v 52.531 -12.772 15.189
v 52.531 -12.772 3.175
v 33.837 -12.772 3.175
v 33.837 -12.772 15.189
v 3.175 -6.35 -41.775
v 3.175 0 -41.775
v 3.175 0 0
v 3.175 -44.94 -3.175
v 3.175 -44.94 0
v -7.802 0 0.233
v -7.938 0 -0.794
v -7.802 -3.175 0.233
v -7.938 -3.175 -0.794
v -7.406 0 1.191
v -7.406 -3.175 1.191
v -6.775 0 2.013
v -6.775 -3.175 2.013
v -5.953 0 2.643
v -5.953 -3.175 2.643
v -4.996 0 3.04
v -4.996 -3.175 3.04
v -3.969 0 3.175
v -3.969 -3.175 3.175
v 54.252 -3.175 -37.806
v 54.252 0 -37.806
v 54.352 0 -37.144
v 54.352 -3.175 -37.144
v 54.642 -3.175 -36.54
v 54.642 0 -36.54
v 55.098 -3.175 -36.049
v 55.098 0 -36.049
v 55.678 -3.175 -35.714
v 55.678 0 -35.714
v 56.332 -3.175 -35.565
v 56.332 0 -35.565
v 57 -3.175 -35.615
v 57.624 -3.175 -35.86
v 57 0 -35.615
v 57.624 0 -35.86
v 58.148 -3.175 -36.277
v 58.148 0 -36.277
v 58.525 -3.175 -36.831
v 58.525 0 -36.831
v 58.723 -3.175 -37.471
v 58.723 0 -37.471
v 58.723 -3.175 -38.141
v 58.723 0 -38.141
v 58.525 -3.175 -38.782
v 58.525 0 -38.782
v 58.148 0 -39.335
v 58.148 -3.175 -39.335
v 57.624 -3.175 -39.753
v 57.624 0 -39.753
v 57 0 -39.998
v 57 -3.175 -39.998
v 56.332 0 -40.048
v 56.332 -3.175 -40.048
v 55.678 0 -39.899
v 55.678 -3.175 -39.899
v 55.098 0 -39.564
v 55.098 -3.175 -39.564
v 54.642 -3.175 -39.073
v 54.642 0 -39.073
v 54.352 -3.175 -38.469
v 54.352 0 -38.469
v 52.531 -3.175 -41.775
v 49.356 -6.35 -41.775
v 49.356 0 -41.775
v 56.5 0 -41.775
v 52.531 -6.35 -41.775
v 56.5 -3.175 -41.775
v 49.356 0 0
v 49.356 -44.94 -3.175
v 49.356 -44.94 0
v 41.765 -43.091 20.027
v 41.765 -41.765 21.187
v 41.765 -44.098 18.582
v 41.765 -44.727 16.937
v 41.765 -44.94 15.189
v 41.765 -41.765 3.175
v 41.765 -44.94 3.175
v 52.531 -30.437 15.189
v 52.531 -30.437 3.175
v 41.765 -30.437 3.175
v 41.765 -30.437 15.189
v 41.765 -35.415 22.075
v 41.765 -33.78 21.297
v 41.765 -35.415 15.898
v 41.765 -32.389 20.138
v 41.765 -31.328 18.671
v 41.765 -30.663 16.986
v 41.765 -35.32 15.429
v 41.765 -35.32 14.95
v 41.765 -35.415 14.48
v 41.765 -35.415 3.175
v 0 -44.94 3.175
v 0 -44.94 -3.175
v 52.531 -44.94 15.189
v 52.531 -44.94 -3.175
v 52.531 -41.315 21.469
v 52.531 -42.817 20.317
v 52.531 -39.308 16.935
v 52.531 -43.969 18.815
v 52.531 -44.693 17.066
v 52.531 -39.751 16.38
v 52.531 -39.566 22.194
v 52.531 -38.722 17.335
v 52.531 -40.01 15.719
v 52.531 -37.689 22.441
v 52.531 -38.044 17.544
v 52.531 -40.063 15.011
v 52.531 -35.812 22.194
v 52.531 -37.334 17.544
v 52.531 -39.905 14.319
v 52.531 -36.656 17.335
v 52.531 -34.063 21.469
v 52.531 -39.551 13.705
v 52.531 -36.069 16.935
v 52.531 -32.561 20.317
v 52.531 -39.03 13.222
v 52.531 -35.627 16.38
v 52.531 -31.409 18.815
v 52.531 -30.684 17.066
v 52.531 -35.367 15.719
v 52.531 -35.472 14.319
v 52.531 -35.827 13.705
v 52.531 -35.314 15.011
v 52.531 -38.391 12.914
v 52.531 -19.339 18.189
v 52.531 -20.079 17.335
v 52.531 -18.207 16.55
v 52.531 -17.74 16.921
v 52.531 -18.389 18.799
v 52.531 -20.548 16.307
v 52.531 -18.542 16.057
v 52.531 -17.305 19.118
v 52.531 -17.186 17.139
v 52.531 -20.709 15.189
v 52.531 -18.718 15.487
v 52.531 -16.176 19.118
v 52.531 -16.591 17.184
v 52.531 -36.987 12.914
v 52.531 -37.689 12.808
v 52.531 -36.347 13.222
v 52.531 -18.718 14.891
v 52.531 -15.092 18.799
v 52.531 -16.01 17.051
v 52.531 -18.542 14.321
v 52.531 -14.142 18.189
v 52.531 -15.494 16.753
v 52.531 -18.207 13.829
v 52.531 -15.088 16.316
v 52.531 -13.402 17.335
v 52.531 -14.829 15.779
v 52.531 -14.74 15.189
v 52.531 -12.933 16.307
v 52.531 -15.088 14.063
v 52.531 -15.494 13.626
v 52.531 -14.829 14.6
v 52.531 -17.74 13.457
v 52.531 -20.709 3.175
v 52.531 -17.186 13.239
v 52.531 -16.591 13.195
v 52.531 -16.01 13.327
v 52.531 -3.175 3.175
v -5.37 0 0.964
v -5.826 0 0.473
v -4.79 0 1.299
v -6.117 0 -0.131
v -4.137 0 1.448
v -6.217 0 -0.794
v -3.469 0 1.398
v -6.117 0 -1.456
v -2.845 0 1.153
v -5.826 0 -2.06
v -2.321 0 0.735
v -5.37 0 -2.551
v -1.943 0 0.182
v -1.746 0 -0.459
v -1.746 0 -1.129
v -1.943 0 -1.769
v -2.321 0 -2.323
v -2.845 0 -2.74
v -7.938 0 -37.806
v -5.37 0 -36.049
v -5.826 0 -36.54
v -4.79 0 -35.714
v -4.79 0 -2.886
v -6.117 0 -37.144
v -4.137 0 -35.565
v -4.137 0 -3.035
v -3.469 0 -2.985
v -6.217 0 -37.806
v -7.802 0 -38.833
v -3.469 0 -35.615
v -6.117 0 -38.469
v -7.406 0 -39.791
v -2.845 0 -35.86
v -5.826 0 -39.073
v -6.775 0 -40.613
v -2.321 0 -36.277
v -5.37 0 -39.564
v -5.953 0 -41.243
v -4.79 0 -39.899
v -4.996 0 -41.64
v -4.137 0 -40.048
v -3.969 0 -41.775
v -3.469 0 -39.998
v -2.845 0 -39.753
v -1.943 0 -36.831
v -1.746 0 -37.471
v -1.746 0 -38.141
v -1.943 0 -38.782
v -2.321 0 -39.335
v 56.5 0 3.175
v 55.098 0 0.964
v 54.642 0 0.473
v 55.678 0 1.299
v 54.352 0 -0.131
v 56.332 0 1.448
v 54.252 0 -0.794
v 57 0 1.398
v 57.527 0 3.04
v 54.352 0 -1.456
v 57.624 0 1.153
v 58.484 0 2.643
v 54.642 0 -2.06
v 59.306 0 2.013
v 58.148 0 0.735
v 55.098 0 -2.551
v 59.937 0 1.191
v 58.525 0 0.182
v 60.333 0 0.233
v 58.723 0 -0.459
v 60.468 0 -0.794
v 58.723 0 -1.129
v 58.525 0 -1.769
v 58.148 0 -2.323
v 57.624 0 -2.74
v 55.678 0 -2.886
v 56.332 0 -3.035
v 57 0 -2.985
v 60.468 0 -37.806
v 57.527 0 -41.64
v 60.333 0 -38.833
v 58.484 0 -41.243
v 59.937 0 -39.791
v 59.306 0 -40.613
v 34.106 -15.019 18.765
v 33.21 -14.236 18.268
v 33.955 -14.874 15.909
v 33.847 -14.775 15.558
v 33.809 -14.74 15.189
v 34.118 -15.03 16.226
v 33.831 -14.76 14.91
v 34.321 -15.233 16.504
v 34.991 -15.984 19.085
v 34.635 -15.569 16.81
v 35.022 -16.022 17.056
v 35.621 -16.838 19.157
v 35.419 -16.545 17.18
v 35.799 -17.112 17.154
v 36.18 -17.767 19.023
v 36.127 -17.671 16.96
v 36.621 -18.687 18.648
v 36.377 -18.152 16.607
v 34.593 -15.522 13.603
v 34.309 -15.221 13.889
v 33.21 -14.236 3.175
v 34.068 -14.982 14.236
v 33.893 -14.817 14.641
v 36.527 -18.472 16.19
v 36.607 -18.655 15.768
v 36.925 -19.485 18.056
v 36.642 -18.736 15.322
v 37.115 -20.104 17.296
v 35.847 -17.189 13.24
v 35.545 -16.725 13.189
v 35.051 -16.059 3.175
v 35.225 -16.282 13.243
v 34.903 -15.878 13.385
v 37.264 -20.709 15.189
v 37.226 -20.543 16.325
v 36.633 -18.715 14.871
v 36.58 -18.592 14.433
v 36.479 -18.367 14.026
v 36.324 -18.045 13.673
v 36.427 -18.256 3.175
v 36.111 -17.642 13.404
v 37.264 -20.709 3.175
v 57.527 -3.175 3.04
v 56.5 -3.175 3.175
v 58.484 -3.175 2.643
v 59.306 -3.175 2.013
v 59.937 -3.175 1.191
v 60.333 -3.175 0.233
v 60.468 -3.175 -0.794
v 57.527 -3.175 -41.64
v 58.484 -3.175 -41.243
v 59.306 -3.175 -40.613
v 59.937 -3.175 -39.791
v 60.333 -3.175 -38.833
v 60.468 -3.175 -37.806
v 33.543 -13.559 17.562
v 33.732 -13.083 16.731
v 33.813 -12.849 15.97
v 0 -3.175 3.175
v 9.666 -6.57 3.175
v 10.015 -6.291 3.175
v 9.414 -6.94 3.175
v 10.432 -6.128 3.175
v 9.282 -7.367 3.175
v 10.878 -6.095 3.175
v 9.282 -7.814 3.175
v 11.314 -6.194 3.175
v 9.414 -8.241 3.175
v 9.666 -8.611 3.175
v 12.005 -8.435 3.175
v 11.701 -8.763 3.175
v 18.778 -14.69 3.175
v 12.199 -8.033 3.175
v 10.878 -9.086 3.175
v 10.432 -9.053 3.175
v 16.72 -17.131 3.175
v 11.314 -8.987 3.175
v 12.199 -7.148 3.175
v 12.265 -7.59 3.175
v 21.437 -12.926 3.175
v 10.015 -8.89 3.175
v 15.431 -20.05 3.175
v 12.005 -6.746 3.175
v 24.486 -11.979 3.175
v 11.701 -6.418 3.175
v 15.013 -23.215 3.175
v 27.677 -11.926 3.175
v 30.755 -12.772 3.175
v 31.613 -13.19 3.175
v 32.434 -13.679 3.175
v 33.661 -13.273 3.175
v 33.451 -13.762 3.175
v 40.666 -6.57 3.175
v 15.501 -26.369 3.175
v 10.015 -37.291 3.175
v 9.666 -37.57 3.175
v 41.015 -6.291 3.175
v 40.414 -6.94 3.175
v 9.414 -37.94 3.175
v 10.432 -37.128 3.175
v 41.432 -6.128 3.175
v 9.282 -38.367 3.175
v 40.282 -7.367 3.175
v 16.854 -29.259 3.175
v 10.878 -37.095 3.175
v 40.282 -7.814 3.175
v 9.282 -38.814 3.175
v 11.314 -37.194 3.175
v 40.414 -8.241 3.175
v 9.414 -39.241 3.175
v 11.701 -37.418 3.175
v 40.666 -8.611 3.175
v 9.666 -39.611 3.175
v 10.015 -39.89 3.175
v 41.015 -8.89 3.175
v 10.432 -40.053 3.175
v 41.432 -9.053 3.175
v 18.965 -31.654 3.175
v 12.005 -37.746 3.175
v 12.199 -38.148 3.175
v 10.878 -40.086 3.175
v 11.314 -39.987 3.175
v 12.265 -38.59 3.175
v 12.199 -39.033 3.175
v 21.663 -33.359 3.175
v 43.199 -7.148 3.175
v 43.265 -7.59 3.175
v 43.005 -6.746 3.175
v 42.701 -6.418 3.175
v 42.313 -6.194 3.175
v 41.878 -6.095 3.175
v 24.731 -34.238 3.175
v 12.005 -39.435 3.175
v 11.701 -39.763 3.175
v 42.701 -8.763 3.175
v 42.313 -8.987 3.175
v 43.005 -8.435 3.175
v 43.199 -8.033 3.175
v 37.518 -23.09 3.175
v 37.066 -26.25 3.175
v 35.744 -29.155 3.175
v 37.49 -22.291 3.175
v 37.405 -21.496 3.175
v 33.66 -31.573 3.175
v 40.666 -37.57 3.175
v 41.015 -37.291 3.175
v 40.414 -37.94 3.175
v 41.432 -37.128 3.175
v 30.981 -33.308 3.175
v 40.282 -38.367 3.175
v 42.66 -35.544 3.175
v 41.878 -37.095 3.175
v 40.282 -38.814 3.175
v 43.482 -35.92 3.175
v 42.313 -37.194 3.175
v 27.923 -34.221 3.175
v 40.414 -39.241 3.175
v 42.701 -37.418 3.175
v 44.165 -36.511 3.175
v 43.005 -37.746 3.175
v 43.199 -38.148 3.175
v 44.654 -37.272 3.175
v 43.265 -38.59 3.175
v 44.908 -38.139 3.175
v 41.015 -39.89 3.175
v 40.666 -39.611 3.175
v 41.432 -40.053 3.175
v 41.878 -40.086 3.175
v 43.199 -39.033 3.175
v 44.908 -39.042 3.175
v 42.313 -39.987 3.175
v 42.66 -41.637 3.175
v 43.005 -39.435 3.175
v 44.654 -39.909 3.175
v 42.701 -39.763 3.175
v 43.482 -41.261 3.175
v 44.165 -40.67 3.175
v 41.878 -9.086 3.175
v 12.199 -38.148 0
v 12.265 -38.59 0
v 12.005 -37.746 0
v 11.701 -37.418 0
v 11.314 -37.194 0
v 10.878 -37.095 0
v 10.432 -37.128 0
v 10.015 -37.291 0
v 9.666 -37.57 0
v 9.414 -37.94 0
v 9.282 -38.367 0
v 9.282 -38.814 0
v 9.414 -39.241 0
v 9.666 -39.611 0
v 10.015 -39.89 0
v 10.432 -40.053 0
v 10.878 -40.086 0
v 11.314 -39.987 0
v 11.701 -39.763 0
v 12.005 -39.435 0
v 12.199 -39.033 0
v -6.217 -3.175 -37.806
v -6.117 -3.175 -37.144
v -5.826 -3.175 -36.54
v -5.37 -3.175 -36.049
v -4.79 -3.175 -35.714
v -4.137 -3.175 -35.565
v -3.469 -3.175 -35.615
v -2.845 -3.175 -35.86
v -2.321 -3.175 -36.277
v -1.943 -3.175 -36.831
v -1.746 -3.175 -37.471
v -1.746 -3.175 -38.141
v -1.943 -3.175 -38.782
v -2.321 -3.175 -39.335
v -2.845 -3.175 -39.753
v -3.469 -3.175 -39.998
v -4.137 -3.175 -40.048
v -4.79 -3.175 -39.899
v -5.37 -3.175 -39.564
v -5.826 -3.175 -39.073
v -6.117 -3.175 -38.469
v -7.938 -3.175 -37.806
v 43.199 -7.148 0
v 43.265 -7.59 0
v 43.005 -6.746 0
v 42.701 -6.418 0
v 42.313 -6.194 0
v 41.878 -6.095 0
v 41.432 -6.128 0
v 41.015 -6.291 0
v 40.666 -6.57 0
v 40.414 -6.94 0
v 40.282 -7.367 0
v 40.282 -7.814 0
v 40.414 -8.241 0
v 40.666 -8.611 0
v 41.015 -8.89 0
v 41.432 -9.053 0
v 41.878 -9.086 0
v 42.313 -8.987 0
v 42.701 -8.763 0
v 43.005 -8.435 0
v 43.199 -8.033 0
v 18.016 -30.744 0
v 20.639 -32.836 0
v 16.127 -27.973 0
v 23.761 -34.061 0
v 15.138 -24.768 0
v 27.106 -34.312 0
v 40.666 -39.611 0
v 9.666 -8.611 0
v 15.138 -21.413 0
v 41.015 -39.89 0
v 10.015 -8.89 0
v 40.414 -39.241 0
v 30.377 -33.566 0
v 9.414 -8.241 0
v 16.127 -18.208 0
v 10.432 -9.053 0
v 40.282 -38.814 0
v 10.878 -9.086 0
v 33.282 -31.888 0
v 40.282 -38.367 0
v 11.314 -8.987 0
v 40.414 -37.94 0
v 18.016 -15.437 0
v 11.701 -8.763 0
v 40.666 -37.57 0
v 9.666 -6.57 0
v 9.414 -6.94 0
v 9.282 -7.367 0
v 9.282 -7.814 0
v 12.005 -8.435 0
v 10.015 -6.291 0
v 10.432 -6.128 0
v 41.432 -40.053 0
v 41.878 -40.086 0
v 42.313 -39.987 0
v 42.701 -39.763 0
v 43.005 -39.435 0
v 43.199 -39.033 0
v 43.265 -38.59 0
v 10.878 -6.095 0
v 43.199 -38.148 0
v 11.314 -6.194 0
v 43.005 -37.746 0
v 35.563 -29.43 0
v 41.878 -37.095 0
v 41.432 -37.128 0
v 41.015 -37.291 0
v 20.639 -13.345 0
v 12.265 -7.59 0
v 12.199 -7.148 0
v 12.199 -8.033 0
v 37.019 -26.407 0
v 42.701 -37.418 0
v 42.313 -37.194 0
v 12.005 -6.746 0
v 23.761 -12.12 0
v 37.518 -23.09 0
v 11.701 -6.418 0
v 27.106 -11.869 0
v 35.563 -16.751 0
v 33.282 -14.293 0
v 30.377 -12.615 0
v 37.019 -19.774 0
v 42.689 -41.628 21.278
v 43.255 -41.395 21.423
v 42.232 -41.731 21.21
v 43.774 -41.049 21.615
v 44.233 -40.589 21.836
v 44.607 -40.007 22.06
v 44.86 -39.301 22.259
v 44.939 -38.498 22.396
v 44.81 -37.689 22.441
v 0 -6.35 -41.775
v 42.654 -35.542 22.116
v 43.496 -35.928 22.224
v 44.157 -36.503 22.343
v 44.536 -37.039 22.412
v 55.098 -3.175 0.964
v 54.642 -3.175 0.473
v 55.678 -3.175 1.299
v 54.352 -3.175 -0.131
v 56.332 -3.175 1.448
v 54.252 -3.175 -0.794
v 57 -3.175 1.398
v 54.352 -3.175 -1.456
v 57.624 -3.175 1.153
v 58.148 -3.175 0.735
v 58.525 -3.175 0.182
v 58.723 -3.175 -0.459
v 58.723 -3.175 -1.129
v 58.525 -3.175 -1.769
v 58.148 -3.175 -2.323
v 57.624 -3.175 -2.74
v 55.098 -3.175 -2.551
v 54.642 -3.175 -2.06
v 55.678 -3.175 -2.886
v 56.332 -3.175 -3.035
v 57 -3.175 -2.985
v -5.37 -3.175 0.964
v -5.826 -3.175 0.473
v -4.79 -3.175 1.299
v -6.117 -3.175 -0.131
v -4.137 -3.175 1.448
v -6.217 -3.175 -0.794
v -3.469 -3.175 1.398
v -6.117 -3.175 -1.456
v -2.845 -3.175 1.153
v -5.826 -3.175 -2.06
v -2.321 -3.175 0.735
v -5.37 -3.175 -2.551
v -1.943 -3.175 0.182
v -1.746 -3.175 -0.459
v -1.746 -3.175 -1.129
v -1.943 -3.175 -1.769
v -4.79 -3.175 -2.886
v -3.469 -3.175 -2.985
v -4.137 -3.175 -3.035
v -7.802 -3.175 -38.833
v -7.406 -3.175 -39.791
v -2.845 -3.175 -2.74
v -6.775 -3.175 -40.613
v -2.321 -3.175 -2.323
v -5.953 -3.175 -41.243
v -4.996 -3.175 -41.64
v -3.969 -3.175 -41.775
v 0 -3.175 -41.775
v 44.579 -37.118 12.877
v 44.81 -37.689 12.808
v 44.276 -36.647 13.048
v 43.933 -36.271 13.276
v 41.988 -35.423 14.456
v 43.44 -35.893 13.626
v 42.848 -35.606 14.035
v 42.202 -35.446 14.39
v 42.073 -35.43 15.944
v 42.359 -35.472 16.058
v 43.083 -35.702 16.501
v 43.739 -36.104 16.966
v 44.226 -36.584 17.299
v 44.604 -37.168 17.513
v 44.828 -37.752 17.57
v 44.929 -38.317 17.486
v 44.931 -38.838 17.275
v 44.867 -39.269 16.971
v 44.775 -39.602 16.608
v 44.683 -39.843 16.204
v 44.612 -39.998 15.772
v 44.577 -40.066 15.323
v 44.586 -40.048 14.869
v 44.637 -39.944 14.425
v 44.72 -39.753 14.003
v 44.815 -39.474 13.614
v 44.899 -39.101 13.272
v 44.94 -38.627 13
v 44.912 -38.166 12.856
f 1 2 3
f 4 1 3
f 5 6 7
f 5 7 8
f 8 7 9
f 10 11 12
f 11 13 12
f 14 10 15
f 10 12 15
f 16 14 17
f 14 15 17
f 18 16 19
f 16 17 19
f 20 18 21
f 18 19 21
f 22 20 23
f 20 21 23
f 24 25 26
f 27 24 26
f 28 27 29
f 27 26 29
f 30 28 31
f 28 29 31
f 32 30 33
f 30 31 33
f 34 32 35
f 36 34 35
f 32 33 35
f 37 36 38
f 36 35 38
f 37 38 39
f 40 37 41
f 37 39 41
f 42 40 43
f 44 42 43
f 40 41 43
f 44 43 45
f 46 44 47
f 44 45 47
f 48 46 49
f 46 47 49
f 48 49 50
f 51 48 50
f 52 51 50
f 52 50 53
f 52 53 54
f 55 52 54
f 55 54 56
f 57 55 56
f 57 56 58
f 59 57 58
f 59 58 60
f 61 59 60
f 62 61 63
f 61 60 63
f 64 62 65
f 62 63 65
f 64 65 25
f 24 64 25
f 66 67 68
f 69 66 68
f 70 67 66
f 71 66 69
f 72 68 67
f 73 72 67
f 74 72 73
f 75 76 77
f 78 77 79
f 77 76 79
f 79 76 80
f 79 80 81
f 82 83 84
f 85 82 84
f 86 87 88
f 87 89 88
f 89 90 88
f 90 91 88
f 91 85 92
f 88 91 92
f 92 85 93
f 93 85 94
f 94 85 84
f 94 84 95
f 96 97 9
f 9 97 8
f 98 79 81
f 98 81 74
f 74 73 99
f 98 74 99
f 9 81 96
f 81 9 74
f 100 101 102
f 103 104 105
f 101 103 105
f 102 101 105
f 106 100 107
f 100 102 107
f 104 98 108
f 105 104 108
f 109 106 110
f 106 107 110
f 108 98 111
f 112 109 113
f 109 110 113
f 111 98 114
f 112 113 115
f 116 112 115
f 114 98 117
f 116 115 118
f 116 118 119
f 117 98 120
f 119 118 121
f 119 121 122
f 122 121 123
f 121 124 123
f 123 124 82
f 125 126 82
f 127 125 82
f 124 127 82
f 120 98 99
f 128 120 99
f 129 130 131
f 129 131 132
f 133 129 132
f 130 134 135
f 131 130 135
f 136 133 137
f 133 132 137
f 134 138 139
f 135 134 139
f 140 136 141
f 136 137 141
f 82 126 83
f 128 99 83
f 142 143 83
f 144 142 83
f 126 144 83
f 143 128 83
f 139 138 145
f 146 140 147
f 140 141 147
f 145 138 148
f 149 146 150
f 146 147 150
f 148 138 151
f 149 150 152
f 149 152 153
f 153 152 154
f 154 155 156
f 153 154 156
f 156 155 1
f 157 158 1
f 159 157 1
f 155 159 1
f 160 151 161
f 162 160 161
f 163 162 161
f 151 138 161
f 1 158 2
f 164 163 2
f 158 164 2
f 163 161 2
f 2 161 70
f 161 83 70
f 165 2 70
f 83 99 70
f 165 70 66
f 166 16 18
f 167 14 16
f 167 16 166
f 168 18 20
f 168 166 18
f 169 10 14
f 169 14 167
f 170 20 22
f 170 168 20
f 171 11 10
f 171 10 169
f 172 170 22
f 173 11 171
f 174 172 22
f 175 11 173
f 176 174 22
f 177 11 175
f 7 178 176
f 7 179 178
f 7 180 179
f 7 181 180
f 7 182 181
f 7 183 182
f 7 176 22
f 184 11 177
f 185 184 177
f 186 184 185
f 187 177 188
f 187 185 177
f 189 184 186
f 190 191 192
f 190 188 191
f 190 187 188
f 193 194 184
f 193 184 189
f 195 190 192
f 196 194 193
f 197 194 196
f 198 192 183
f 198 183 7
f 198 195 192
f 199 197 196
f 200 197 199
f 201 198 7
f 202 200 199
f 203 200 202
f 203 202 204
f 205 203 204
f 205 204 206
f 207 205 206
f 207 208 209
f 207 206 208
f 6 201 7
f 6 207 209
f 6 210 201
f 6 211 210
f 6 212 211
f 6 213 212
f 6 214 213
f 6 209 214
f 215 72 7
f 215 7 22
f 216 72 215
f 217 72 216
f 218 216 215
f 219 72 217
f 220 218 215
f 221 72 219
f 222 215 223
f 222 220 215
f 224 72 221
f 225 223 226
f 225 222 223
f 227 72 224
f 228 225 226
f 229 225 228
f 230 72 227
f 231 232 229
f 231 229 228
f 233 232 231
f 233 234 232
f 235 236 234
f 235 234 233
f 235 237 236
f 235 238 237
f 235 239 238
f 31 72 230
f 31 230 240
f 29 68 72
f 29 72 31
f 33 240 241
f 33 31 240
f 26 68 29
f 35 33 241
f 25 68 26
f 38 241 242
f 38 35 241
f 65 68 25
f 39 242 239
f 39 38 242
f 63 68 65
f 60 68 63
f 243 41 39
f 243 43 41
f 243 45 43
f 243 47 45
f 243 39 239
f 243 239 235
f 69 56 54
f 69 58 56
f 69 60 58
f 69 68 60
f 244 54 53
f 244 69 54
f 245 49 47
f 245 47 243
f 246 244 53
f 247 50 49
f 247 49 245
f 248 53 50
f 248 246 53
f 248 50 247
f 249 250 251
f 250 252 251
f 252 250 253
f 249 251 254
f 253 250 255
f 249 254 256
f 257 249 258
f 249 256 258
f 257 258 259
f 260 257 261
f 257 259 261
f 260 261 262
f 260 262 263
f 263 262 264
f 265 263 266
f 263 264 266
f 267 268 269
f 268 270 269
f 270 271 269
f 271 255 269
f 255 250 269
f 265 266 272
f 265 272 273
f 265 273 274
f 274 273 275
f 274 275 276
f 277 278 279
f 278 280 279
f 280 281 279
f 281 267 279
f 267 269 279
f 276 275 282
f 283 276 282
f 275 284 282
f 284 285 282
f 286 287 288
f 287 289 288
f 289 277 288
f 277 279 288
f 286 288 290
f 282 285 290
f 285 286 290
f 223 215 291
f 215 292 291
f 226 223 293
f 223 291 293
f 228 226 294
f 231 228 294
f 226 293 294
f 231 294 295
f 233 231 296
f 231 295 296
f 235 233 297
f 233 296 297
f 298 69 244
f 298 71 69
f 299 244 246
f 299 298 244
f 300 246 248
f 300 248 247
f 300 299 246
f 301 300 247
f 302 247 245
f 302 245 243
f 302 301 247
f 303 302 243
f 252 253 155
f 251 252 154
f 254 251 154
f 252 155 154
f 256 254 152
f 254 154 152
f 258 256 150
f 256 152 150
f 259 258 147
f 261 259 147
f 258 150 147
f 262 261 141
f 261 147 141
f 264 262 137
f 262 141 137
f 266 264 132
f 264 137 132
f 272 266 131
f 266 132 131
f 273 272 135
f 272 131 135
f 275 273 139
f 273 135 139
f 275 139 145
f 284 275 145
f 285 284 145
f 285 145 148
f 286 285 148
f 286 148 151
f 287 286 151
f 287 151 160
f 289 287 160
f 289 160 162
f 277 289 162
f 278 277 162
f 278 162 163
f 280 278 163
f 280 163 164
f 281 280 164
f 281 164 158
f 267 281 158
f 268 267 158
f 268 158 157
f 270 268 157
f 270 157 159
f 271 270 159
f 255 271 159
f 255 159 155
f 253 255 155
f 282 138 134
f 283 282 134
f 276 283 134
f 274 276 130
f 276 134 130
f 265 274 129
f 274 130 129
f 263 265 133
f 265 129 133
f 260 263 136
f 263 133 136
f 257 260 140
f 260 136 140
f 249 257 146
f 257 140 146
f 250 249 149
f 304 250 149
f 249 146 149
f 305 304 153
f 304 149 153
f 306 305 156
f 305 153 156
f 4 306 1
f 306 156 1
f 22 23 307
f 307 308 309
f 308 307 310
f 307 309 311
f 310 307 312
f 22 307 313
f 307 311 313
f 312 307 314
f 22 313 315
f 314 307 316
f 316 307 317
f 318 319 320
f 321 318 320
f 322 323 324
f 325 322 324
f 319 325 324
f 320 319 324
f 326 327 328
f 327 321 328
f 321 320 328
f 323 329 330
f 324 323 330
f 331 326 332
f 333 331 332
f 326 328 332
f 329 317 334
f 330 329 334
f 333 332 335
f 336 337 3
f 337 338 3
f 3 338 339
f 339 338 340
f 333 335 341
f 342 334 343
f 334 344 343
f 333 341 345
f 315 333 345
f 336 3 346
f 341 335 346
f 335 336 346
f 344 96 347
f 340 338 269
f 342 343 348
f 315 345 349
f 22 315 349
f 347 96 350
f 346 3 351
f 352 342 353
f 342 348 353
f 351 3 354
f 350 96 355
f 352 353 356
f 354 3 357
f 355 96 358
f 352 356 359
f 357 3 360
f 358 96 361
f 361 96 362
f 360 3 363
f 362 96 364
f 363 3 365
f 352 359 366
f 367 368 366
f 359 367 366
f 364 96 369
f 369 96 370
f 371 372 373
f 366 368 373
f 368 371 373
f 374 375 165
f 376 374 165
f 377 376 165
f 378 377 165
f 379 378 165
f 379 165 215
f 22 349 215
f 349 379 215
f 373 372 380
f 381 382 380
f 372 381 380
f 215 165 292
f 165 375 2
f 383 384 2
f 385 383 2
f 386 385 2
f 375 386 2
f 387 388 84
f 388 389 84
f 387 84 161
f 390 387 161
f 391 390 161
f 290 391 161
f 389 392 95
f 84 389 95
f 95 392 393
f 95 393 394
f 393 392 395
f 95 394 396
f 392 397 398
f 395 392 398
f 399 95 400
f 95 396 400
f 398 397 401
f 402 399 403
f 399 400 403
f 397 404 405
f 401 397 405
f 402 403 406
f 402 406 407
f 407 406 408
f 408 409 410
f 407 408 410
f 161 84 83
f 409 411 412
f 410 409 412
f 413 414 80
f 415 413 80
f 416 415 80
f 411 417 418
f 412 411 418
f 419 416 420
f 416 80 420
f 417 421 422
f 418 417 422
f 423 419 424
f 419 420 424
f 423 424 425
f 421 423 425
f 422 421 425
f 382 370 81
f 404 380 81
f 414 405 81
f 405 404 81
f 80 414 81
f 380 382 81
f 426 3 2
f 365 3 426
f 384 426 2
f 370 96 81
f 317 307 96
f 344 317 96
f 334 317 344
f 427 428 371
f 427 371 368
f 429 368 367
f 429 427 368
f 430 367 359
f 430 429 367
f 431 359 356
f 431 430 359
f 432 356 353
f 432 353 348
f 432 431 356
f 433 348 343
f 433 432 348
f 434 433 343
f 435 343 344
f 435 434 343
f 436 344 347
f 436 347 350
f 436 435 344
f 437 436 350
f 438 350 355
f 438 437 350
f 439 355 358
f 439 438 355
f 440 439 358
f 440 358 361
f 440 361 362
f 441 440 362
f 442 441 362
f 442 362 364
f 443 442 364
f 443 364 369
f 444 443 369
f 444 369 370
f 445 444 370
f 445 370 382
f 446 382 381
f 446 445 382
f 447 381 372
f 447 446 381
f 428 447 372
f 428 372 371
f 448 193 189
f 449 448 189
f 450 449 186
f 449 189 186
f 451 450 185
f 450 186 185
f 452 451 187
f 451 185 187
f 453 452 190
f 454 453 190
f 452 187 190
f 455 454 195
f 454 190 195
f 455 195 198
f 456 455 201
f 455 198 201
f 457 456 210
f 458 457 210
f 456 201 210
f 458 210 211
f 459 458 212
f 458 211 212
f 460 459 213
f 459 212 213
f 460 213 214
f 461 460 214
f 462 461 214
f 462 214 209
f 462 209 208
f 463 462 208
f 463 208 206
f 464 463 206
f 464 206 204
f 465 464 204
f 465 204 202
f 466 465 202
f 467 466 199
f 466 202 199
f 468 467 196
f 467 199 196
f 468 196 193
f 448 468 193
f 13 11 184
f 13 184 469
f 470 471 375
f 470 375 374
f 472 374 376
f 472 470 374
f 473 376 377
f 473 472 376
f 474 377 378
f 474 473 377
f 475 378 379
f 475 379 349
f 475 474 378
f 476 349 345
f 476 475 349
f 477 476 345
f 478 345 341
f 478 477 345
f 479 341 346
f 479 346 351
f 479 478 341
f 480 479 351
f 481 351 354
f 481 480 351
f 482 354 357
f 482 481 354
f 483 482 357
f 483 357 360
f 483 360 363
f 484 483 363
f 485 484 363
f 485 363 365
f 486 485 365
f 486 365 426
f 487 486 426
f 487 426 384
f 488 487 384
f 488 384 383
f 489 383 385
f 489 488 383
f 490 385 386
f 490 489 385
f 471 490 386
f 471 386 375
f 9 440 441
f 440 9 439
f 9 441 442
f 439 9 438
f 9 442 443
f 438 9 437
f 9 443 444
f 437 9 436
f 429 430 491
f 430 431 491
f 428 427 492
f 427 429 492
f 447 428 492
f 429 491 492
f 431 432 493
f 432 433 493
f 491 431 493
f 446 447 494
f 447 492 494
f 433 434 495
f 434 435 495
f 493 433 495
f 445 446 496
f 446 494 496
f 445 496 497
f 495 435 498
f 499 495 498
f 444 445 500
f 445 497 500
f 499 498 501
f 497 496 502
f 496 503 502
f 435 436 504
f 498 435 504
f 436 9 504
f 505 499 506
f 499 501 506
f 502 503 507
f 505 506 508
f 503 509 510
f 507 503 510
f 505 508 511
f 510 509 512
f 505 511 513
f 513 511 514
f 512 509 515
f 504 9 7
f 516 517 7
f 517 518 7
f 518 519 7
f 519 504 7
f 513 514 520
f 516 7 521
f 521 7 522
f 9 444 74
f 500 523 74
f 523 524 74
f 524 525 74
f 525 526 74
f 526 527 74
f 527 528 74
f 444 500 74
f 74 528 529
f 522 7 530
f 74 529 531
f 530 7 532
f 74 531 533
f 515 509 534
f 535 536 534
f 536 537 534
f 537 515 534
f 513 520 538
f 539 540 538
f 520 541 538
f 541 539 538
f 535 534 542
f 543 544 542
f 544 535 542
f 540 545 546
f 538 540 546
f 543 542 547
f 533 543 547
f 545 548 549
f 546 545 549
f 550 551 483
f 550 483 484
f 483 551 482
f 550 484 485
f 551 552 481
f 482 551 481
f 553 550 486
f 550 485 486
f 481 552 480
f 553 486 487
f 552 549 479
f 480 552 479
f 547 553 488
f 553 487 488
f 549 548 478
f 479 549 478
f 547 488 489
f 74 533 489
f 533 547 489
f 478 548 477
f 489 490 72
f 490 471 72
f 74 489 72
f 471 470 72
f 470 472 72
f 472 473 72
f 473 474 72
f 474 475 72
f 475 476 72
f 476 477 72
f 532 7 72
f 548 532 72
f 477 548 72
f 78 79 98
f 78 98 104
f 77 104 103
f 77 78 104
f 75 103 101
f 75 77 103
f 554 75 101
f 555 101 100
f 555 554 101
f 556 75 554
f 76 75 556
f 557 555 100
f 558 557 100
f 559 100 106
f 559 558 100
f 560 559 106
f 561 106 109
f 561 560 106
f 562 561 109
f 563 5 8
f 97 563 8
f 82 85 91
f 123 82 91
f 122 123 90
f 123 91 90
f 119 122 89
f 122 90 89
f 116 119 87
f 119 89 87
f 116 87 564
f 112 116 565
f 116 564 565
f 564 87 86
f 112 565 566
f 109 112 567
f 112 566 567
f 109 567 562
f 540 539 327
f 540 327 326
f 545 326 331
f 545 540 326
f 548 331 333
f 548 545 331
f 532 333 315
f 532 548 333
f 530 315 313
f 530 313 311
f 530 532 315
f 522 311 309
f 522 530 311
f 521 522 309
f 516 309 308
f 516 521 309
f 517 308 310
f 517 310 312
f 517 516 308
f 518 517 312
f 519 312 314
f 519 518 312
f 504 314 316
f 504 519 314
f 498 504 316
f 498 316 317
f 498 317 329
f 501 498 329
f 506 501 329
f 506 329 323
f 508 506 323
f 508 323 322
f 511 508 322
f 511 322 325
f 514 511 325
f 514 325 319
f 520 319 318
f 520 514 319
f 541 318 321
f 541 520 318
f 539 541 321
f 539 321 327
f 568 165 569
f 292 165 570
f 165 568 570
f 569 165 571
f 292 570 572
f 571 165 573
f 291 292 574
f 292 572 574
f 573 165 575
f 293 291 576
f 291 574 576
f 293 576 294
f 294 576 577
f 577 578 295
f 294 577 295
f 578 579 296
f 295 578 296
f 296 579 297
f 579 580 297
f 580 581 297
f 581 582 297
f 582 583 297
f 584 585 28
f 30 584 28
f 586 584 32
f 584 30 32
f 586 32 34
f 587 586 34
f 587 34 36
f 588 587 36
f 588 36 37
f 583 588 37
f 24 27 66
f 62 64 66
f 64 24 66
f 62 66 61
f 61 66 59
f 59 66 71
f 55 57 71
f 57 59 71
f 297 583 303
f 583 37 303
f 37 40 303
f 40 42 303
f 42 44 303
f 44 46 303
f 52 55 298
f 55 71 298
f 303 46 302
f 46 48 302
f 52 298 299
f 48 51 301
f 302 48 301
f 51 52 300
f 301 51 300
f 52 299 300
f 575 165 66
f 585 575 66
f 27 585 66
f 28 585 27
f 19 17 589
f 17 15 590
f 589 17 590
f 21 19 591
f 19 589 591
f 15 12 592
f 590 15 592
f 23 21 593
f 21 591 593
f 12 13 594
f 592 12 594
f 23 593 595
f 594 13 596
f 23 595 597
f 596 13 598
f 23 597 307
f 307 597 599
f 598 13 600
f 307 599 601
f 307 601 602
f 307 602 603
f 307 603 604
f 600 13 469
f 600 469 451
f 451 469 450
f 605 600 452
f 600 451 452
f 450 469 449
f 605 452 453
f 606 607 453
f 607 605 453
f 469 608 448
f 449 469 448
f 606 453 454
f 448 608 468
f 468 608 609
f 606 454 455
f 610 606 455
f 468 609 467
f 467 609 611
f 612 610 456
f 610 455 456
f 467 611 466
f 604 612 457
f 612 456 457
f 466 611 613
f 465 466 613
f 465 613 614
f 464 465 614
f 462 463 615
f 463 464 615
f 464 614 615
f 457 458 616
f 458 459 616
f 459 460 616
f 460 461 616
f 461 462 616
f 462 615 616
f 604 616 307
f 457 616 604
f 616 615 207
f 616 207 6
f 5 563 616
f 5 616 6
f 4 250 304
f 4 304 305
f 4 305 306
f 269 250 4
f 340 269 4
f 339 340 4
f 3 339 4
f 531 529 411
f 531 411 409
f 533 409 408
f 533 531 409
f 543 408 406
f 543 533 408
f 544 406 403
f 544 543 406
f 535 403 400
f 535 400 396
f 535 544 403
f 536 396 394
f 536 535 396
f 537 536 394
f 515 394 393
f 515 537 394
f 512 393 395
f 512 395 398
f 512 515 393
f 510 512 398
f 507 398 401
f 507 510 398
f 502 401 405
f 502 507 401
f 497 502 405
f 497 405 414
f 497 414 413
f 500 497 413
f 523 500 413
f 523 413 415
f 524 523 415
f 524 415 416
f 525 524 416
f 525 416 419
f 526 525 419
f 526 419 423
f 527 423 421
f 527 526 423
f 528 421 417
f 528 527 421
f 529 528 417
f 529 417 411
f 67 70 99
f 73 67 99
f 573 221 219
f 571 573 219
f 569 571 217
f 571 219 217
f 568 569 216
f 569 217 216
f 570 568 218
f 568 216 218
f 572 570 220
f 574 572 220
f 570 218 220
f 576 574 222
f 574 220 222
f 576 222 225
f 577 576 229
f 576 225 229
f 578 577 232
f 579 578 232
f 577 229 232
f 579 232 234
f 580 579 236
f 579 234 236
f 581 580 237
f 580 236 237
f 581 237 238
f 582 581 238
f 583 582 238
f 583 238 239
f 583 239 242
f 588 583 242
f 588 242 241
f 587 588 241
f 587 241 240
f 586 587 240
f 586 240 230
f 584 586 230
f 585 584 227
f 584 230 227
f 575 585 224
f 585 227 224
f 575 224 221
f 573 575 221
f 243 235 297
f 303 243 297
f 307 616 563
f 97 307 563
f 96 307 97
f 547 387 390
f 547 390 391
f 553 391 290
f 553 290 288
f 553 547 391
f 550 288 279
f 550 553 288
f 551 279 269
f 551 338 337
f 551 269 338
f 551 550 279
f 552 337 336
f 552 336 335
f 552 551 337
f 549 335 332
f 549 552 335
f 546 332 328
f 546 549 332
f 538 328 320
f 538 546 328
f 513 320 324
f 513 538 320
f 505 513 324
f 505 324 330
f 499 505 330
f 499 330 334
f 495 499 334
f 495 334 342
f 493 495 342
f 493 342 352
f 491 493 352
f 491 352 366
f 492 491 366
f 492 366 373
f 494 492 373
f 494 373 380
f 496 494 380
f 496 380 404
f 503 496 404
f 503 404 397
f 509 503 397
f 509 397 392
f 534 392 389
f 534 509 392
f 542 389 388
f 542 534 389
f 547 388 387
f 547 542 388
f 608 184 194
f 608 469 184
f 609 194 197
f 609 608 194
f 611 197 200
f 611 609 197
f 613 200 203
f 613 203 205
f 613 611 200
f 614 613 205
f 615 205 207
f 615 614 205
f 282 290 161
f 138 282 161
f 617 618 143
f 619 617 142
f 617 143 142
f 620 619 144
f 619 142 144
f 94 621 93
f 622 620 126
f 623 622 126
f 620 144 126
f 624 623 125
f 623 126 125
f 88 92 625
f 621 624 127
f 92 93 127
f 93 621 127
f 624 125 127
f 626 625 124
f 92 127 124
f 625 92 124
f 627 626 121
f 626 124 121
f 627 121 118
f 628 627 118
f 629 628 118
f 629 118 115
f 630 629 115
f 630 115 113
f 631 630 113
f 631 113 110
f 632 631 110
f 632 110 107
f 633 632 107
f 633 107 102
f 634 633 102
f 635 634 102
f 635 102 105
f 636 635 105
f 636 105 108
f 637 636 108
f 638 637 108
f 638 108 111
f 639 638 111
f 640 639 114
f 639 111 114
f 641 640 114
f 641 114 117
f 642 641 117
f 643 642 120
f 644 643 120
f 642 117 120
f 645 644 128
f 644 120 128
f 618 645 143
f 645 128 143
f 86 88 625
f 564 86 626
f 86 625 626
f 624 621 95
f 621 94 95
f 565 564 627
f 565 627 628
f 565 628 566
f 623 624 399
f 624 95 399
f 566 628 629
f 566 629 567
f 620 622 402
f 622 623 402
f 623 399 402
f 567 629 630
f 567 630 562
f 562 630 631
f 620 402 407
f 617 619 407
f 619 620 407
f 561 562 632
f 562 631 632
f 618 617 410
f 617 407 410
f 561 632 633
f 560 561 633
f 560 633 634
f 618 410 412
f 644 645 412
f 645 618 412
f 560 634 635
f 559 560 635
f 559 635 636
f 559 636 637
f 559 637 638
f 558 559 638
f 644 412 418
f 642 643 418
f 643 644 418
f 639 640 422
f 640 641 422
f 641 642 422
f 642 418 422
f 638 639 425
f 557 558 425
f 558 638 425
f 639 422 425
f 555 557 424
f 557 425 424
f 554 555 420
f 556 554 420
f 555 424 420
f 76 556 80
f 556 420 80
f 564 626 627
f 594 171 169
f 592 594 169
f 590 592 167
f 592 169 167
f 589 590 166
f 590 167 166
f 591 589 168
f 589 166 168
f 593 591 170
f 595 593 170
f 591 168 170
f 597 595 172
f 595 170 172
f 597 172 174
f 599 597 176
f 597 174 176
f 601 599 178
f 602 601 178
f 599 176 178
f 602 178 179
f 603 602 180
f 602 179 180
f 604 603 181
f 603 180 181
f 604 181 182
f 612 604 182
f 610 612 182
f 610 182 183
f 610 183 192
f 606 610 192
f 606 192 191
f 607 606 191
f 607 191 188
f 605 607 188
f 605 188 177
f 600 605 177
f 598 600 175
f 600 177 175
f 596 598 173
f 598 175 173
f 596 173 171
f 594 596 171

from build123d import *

# Parameters (mm, degrees)
F0_W         = 52.5309846
F0_H         = 44.9404867
F0_R         = 1.5
F0_R_2       = 11.2530001
F1_DEPTH     = 3.175
F2_W         = 3.175
F2_H         = 44.9404867
F3_DEPTH     = 41.774999
F4_W         = 7.9375
F4_H         = 3.175
F5_DEPTH     = 44.949999
F6_R         = 3.96875
F7_R         = 2.2479
F8_DEPTH     = 3.175
F10_DEPTH    = 52.5309846
F12_DEPTH    = 19.2659
F14_DEPTH    = 10.7654979
F15_T1_DEPTH = 47.0239979
F16_R        = 2
F17_DEPTH    = 134
F18_R        = 7.9375
F19_DEPTH    = 25.4


# Not quite as in the source:
# - a fillet or chamfer that OpenCascade refuses, or shapes differently, is made with other operations: its cross-section is extruded or revolved along the edge and cut away or added
# - an extrude ends at something that could not be found from the text; its depth is read off the source's solid
# - a feature names something its author has since deleted; it is built from what else it names


with BuildPart() as f1:
    # F0 (on Top) → F1 (new body)
    with BuildSketch(Plane.XY):
        with Locations((26.2654923, -22.47024335)):
            Rectangle(F0_W, F0_H)
        with Locations((10.7654979, -38.5904867)):
            Circle(F0_R, mode=Mode.SUBTRACT)
        with Locations((26.2654923, -23.0904923)):
            Circle(F0_R_2, mode=Mode.SUBTRACT)
        with Locations((41.7654867, -38.5904867)):
            Circle(F0_R, mode=Mode.SUBTRACT)
        with Locations((10.7654979, -7.5904979)):
            Circle(F0_R, mode=Mode.SUBTRACT)
        with Locations((41.7654867, -7.5904979)):
            Circle(F0_R, mode=Mode.SUBTRACT)
    extrude(amount=F1_DEPTH)

    # F2 (on face) → F3 (join)
    with BuildSketch(Plane(origin=(0, 0, 0), x_dir=(1, 0, 0), z_dir=(0, 0, -1))):
        with Locations((1.5875, 22.47024335)):
            Rectangle(F2_W, F2_H)
        with Locations((50.9434846, 22.47024335)):
            Rectangle(F2_W, F2_H)
    extrude(amount=F3_DEPTH)

    # F4 (on face) → F5 (join, through all)
    with BuildSketch(Plane(origin=(0, 0, -41.774999), x_dir=(1, 0, 0), z_dir=(0, 0, -1))):
        with Locations((-3.96875, 1.5875)):
            Rectangle(F4_W, F4_H)
        with Locations((56.4997346, 1.5875)):
            Rectangle(F4_W, F4_H)
    extrude(amount=-F5_DEPTH)

    # F6
    f6_edges = [f1.edges().sort_by_distance(p)[0] for p in [
        (60.468485, -1.5875, -41.774999),
        (60.468485, -1.5875, 3.175),
        (-7.9375, -1.5875, 3.175),
        (-7.9375, -1.5875, -41.774999),
    ]]
    fillet(f6_edges, radius=F6_R)

    # F7 (on face) → F8 (cut, through all)
    with BuildSketch(Plane(origin=(0, 0, 0), x_dir=(-1, 0, 0), z_dir=(0, 1, 0))):
        with Locations((3.96875, -37.806249)):
            Circle(F7_R)
        with Locations((3.96875, -0.79375)):
            Circle(F7_R)
        with Locations((-56.4997346, -0.79375)):
            Circle(F7_R)
        with Locations((-56.4997346, -37.806249)):
            Circle(F7_R)
    extrude(amount=-F8_DEPTH, mode=Mode.SUBTRACT)

    # F9 (on face) → F10 (cut, through all)
    with BuildSketch(Plane.YZ.offset(52.5309846)):
        Polygon((-44.9404867, -3.175), (-44.9404867, -41.774999), (-6.35, -41.774999), align=None)
    extrude(amount=-F10_DEPTH, mode=Mode.SUBTRACT)

    # F11 (on face) → F12 (join)
    with BuildSketch(Plane.XY.offset(3.175)):
        with BuildLine():
            Line((41.7654867, -44.9404867), (52.5309846, -44.9404867))
            Line((52.5309846, -44.9404867), (52.5309846, -30.4370867))
            Line((52.5309846, -30.4370867), (41.7654867, -30.4370867))
            Line((41.7654867, -30.4370867), (41.7654867, -35.4154867))
            ThreePointArc((41.7654867, -35.4154867), (44.9404867, -38.5904867), (41.7654867, -41.7654867))
            Line((41.7654867, -41.7654867), (41.7654867, -44.9404867))
        make_face()
        with BuildLine():
            Line((52.5309846, -20.7092423), (52.5309846, -12.7717423))
            Line((52.5309846, -12.7717423), (30.7547472146, -12.7717423))
            ThreePointArc((30.7547472146, -12.7717423), (34.966988133, -15.9550889113), (37.2636584966, -20.7092423))
            Line((37.2636584966, -20.7092423), (52.5309846, -20.7092423))
        make_face()
    extrude(amount=F12_DEPTH)

    # F13 (on face) → F14 (cut, through all)
    with BuildSketch(Plane.YZ.offset(52.5309846)):
        with BuildLine():
            Line((-40.0700367, 15.1892), (-37.6887867, 15.1892))
            Line((-37.6887867, 15.1892), (-37.6887867, 12.80795))
            ThreePointArc((-37.6887867, 12.80795), (-36.0049886773, 13.5054019773), (-35.3075367, 15.1892))
            ThreePointArc((-35.3075367, 15.1892), (-37.6887867, 17.57045), (-40.0700367, 15.1892))
        make_face()
        with BuildLine():
            Line((-37.6887867, 12.80795), (-37.6887867, 15.1892))
            Line((-37.6887867, 15.1892), (-40.0700367, 15.1892))
            ThreePointArc((-40.0700367, 15.1892), (-39.3725847227, 13.5054019773), (-37.6887867, 12.80795))
        make_face()
    extrude(amount=-F14_DEPTH, mode=Mode.SUBTRACT)

    # F15: fillet of radius 7.2517 on 2 edges, made by hand

    # F15_s2 → F15_t1 (cut)
    with BuildSketch(Plane.YZ.offset(23.6362367)):
        with BuildLine():
            ThreePointArc((-44.9404867, 15.1892), (-42.8165129451, 20.3169262451), (-37.6887867, 22.4409))
            Line((-37.6887867, 22.4409), (-44.9404867, 22.4409))
            Line((-44.9404867, 22.4409), (-44.9404867, 15.1892))
        make_face()
        with BuildLine():
            ThreePointArc((-30.4370867, 15.1892), (-32.5610604549, 20.3169262451), (-37.6887867, 22.4409))
            Line((-37.6887867, 22.4409), (-30.4370867, 22.4409))
            Line((-30.4370867, 22.4409), (-30.4370867, 15.1892))
        make_face()
    extrude(amount=F15_T1_DEPTH, mode=Mode.SUBTRACT)

    # F16 (on face) → F17 (cut, through all)
    with BuildSketch(Plane.YZ.offset(52.5309846)):
        with BuildLine():
            Line((-12.7717423, 22.4409), (-20.7092423, 22.4409))
            Line((-20.7092423, 22.4409), (-20.7092423, 15.1892))
            ThreePointArc((-20.7092423, 15.1892), (-16.7404923, 19.15795), (-12.7717423, 15.1892))
            Line((-12.7717423, 15.1892), (-12.7717423, 22.4409))
        make_face()
        with Locations((-16.7404923, 15.1892)):
            Circle(F16_R)
    extrude(amount=-F17_DEPTH, mode=Mode.SUBTRACT)

    # F18 (on face) → F19 (cut)
    with BuildSketch(Plane.XY.offset(3.175)):
        with Locations((26.2654923, -10.3904923)):
            Circle(F18_R)
    extrude(amount=F19_DEPTH, mode=Mode.SUBTRACT)


solid = f1.part
